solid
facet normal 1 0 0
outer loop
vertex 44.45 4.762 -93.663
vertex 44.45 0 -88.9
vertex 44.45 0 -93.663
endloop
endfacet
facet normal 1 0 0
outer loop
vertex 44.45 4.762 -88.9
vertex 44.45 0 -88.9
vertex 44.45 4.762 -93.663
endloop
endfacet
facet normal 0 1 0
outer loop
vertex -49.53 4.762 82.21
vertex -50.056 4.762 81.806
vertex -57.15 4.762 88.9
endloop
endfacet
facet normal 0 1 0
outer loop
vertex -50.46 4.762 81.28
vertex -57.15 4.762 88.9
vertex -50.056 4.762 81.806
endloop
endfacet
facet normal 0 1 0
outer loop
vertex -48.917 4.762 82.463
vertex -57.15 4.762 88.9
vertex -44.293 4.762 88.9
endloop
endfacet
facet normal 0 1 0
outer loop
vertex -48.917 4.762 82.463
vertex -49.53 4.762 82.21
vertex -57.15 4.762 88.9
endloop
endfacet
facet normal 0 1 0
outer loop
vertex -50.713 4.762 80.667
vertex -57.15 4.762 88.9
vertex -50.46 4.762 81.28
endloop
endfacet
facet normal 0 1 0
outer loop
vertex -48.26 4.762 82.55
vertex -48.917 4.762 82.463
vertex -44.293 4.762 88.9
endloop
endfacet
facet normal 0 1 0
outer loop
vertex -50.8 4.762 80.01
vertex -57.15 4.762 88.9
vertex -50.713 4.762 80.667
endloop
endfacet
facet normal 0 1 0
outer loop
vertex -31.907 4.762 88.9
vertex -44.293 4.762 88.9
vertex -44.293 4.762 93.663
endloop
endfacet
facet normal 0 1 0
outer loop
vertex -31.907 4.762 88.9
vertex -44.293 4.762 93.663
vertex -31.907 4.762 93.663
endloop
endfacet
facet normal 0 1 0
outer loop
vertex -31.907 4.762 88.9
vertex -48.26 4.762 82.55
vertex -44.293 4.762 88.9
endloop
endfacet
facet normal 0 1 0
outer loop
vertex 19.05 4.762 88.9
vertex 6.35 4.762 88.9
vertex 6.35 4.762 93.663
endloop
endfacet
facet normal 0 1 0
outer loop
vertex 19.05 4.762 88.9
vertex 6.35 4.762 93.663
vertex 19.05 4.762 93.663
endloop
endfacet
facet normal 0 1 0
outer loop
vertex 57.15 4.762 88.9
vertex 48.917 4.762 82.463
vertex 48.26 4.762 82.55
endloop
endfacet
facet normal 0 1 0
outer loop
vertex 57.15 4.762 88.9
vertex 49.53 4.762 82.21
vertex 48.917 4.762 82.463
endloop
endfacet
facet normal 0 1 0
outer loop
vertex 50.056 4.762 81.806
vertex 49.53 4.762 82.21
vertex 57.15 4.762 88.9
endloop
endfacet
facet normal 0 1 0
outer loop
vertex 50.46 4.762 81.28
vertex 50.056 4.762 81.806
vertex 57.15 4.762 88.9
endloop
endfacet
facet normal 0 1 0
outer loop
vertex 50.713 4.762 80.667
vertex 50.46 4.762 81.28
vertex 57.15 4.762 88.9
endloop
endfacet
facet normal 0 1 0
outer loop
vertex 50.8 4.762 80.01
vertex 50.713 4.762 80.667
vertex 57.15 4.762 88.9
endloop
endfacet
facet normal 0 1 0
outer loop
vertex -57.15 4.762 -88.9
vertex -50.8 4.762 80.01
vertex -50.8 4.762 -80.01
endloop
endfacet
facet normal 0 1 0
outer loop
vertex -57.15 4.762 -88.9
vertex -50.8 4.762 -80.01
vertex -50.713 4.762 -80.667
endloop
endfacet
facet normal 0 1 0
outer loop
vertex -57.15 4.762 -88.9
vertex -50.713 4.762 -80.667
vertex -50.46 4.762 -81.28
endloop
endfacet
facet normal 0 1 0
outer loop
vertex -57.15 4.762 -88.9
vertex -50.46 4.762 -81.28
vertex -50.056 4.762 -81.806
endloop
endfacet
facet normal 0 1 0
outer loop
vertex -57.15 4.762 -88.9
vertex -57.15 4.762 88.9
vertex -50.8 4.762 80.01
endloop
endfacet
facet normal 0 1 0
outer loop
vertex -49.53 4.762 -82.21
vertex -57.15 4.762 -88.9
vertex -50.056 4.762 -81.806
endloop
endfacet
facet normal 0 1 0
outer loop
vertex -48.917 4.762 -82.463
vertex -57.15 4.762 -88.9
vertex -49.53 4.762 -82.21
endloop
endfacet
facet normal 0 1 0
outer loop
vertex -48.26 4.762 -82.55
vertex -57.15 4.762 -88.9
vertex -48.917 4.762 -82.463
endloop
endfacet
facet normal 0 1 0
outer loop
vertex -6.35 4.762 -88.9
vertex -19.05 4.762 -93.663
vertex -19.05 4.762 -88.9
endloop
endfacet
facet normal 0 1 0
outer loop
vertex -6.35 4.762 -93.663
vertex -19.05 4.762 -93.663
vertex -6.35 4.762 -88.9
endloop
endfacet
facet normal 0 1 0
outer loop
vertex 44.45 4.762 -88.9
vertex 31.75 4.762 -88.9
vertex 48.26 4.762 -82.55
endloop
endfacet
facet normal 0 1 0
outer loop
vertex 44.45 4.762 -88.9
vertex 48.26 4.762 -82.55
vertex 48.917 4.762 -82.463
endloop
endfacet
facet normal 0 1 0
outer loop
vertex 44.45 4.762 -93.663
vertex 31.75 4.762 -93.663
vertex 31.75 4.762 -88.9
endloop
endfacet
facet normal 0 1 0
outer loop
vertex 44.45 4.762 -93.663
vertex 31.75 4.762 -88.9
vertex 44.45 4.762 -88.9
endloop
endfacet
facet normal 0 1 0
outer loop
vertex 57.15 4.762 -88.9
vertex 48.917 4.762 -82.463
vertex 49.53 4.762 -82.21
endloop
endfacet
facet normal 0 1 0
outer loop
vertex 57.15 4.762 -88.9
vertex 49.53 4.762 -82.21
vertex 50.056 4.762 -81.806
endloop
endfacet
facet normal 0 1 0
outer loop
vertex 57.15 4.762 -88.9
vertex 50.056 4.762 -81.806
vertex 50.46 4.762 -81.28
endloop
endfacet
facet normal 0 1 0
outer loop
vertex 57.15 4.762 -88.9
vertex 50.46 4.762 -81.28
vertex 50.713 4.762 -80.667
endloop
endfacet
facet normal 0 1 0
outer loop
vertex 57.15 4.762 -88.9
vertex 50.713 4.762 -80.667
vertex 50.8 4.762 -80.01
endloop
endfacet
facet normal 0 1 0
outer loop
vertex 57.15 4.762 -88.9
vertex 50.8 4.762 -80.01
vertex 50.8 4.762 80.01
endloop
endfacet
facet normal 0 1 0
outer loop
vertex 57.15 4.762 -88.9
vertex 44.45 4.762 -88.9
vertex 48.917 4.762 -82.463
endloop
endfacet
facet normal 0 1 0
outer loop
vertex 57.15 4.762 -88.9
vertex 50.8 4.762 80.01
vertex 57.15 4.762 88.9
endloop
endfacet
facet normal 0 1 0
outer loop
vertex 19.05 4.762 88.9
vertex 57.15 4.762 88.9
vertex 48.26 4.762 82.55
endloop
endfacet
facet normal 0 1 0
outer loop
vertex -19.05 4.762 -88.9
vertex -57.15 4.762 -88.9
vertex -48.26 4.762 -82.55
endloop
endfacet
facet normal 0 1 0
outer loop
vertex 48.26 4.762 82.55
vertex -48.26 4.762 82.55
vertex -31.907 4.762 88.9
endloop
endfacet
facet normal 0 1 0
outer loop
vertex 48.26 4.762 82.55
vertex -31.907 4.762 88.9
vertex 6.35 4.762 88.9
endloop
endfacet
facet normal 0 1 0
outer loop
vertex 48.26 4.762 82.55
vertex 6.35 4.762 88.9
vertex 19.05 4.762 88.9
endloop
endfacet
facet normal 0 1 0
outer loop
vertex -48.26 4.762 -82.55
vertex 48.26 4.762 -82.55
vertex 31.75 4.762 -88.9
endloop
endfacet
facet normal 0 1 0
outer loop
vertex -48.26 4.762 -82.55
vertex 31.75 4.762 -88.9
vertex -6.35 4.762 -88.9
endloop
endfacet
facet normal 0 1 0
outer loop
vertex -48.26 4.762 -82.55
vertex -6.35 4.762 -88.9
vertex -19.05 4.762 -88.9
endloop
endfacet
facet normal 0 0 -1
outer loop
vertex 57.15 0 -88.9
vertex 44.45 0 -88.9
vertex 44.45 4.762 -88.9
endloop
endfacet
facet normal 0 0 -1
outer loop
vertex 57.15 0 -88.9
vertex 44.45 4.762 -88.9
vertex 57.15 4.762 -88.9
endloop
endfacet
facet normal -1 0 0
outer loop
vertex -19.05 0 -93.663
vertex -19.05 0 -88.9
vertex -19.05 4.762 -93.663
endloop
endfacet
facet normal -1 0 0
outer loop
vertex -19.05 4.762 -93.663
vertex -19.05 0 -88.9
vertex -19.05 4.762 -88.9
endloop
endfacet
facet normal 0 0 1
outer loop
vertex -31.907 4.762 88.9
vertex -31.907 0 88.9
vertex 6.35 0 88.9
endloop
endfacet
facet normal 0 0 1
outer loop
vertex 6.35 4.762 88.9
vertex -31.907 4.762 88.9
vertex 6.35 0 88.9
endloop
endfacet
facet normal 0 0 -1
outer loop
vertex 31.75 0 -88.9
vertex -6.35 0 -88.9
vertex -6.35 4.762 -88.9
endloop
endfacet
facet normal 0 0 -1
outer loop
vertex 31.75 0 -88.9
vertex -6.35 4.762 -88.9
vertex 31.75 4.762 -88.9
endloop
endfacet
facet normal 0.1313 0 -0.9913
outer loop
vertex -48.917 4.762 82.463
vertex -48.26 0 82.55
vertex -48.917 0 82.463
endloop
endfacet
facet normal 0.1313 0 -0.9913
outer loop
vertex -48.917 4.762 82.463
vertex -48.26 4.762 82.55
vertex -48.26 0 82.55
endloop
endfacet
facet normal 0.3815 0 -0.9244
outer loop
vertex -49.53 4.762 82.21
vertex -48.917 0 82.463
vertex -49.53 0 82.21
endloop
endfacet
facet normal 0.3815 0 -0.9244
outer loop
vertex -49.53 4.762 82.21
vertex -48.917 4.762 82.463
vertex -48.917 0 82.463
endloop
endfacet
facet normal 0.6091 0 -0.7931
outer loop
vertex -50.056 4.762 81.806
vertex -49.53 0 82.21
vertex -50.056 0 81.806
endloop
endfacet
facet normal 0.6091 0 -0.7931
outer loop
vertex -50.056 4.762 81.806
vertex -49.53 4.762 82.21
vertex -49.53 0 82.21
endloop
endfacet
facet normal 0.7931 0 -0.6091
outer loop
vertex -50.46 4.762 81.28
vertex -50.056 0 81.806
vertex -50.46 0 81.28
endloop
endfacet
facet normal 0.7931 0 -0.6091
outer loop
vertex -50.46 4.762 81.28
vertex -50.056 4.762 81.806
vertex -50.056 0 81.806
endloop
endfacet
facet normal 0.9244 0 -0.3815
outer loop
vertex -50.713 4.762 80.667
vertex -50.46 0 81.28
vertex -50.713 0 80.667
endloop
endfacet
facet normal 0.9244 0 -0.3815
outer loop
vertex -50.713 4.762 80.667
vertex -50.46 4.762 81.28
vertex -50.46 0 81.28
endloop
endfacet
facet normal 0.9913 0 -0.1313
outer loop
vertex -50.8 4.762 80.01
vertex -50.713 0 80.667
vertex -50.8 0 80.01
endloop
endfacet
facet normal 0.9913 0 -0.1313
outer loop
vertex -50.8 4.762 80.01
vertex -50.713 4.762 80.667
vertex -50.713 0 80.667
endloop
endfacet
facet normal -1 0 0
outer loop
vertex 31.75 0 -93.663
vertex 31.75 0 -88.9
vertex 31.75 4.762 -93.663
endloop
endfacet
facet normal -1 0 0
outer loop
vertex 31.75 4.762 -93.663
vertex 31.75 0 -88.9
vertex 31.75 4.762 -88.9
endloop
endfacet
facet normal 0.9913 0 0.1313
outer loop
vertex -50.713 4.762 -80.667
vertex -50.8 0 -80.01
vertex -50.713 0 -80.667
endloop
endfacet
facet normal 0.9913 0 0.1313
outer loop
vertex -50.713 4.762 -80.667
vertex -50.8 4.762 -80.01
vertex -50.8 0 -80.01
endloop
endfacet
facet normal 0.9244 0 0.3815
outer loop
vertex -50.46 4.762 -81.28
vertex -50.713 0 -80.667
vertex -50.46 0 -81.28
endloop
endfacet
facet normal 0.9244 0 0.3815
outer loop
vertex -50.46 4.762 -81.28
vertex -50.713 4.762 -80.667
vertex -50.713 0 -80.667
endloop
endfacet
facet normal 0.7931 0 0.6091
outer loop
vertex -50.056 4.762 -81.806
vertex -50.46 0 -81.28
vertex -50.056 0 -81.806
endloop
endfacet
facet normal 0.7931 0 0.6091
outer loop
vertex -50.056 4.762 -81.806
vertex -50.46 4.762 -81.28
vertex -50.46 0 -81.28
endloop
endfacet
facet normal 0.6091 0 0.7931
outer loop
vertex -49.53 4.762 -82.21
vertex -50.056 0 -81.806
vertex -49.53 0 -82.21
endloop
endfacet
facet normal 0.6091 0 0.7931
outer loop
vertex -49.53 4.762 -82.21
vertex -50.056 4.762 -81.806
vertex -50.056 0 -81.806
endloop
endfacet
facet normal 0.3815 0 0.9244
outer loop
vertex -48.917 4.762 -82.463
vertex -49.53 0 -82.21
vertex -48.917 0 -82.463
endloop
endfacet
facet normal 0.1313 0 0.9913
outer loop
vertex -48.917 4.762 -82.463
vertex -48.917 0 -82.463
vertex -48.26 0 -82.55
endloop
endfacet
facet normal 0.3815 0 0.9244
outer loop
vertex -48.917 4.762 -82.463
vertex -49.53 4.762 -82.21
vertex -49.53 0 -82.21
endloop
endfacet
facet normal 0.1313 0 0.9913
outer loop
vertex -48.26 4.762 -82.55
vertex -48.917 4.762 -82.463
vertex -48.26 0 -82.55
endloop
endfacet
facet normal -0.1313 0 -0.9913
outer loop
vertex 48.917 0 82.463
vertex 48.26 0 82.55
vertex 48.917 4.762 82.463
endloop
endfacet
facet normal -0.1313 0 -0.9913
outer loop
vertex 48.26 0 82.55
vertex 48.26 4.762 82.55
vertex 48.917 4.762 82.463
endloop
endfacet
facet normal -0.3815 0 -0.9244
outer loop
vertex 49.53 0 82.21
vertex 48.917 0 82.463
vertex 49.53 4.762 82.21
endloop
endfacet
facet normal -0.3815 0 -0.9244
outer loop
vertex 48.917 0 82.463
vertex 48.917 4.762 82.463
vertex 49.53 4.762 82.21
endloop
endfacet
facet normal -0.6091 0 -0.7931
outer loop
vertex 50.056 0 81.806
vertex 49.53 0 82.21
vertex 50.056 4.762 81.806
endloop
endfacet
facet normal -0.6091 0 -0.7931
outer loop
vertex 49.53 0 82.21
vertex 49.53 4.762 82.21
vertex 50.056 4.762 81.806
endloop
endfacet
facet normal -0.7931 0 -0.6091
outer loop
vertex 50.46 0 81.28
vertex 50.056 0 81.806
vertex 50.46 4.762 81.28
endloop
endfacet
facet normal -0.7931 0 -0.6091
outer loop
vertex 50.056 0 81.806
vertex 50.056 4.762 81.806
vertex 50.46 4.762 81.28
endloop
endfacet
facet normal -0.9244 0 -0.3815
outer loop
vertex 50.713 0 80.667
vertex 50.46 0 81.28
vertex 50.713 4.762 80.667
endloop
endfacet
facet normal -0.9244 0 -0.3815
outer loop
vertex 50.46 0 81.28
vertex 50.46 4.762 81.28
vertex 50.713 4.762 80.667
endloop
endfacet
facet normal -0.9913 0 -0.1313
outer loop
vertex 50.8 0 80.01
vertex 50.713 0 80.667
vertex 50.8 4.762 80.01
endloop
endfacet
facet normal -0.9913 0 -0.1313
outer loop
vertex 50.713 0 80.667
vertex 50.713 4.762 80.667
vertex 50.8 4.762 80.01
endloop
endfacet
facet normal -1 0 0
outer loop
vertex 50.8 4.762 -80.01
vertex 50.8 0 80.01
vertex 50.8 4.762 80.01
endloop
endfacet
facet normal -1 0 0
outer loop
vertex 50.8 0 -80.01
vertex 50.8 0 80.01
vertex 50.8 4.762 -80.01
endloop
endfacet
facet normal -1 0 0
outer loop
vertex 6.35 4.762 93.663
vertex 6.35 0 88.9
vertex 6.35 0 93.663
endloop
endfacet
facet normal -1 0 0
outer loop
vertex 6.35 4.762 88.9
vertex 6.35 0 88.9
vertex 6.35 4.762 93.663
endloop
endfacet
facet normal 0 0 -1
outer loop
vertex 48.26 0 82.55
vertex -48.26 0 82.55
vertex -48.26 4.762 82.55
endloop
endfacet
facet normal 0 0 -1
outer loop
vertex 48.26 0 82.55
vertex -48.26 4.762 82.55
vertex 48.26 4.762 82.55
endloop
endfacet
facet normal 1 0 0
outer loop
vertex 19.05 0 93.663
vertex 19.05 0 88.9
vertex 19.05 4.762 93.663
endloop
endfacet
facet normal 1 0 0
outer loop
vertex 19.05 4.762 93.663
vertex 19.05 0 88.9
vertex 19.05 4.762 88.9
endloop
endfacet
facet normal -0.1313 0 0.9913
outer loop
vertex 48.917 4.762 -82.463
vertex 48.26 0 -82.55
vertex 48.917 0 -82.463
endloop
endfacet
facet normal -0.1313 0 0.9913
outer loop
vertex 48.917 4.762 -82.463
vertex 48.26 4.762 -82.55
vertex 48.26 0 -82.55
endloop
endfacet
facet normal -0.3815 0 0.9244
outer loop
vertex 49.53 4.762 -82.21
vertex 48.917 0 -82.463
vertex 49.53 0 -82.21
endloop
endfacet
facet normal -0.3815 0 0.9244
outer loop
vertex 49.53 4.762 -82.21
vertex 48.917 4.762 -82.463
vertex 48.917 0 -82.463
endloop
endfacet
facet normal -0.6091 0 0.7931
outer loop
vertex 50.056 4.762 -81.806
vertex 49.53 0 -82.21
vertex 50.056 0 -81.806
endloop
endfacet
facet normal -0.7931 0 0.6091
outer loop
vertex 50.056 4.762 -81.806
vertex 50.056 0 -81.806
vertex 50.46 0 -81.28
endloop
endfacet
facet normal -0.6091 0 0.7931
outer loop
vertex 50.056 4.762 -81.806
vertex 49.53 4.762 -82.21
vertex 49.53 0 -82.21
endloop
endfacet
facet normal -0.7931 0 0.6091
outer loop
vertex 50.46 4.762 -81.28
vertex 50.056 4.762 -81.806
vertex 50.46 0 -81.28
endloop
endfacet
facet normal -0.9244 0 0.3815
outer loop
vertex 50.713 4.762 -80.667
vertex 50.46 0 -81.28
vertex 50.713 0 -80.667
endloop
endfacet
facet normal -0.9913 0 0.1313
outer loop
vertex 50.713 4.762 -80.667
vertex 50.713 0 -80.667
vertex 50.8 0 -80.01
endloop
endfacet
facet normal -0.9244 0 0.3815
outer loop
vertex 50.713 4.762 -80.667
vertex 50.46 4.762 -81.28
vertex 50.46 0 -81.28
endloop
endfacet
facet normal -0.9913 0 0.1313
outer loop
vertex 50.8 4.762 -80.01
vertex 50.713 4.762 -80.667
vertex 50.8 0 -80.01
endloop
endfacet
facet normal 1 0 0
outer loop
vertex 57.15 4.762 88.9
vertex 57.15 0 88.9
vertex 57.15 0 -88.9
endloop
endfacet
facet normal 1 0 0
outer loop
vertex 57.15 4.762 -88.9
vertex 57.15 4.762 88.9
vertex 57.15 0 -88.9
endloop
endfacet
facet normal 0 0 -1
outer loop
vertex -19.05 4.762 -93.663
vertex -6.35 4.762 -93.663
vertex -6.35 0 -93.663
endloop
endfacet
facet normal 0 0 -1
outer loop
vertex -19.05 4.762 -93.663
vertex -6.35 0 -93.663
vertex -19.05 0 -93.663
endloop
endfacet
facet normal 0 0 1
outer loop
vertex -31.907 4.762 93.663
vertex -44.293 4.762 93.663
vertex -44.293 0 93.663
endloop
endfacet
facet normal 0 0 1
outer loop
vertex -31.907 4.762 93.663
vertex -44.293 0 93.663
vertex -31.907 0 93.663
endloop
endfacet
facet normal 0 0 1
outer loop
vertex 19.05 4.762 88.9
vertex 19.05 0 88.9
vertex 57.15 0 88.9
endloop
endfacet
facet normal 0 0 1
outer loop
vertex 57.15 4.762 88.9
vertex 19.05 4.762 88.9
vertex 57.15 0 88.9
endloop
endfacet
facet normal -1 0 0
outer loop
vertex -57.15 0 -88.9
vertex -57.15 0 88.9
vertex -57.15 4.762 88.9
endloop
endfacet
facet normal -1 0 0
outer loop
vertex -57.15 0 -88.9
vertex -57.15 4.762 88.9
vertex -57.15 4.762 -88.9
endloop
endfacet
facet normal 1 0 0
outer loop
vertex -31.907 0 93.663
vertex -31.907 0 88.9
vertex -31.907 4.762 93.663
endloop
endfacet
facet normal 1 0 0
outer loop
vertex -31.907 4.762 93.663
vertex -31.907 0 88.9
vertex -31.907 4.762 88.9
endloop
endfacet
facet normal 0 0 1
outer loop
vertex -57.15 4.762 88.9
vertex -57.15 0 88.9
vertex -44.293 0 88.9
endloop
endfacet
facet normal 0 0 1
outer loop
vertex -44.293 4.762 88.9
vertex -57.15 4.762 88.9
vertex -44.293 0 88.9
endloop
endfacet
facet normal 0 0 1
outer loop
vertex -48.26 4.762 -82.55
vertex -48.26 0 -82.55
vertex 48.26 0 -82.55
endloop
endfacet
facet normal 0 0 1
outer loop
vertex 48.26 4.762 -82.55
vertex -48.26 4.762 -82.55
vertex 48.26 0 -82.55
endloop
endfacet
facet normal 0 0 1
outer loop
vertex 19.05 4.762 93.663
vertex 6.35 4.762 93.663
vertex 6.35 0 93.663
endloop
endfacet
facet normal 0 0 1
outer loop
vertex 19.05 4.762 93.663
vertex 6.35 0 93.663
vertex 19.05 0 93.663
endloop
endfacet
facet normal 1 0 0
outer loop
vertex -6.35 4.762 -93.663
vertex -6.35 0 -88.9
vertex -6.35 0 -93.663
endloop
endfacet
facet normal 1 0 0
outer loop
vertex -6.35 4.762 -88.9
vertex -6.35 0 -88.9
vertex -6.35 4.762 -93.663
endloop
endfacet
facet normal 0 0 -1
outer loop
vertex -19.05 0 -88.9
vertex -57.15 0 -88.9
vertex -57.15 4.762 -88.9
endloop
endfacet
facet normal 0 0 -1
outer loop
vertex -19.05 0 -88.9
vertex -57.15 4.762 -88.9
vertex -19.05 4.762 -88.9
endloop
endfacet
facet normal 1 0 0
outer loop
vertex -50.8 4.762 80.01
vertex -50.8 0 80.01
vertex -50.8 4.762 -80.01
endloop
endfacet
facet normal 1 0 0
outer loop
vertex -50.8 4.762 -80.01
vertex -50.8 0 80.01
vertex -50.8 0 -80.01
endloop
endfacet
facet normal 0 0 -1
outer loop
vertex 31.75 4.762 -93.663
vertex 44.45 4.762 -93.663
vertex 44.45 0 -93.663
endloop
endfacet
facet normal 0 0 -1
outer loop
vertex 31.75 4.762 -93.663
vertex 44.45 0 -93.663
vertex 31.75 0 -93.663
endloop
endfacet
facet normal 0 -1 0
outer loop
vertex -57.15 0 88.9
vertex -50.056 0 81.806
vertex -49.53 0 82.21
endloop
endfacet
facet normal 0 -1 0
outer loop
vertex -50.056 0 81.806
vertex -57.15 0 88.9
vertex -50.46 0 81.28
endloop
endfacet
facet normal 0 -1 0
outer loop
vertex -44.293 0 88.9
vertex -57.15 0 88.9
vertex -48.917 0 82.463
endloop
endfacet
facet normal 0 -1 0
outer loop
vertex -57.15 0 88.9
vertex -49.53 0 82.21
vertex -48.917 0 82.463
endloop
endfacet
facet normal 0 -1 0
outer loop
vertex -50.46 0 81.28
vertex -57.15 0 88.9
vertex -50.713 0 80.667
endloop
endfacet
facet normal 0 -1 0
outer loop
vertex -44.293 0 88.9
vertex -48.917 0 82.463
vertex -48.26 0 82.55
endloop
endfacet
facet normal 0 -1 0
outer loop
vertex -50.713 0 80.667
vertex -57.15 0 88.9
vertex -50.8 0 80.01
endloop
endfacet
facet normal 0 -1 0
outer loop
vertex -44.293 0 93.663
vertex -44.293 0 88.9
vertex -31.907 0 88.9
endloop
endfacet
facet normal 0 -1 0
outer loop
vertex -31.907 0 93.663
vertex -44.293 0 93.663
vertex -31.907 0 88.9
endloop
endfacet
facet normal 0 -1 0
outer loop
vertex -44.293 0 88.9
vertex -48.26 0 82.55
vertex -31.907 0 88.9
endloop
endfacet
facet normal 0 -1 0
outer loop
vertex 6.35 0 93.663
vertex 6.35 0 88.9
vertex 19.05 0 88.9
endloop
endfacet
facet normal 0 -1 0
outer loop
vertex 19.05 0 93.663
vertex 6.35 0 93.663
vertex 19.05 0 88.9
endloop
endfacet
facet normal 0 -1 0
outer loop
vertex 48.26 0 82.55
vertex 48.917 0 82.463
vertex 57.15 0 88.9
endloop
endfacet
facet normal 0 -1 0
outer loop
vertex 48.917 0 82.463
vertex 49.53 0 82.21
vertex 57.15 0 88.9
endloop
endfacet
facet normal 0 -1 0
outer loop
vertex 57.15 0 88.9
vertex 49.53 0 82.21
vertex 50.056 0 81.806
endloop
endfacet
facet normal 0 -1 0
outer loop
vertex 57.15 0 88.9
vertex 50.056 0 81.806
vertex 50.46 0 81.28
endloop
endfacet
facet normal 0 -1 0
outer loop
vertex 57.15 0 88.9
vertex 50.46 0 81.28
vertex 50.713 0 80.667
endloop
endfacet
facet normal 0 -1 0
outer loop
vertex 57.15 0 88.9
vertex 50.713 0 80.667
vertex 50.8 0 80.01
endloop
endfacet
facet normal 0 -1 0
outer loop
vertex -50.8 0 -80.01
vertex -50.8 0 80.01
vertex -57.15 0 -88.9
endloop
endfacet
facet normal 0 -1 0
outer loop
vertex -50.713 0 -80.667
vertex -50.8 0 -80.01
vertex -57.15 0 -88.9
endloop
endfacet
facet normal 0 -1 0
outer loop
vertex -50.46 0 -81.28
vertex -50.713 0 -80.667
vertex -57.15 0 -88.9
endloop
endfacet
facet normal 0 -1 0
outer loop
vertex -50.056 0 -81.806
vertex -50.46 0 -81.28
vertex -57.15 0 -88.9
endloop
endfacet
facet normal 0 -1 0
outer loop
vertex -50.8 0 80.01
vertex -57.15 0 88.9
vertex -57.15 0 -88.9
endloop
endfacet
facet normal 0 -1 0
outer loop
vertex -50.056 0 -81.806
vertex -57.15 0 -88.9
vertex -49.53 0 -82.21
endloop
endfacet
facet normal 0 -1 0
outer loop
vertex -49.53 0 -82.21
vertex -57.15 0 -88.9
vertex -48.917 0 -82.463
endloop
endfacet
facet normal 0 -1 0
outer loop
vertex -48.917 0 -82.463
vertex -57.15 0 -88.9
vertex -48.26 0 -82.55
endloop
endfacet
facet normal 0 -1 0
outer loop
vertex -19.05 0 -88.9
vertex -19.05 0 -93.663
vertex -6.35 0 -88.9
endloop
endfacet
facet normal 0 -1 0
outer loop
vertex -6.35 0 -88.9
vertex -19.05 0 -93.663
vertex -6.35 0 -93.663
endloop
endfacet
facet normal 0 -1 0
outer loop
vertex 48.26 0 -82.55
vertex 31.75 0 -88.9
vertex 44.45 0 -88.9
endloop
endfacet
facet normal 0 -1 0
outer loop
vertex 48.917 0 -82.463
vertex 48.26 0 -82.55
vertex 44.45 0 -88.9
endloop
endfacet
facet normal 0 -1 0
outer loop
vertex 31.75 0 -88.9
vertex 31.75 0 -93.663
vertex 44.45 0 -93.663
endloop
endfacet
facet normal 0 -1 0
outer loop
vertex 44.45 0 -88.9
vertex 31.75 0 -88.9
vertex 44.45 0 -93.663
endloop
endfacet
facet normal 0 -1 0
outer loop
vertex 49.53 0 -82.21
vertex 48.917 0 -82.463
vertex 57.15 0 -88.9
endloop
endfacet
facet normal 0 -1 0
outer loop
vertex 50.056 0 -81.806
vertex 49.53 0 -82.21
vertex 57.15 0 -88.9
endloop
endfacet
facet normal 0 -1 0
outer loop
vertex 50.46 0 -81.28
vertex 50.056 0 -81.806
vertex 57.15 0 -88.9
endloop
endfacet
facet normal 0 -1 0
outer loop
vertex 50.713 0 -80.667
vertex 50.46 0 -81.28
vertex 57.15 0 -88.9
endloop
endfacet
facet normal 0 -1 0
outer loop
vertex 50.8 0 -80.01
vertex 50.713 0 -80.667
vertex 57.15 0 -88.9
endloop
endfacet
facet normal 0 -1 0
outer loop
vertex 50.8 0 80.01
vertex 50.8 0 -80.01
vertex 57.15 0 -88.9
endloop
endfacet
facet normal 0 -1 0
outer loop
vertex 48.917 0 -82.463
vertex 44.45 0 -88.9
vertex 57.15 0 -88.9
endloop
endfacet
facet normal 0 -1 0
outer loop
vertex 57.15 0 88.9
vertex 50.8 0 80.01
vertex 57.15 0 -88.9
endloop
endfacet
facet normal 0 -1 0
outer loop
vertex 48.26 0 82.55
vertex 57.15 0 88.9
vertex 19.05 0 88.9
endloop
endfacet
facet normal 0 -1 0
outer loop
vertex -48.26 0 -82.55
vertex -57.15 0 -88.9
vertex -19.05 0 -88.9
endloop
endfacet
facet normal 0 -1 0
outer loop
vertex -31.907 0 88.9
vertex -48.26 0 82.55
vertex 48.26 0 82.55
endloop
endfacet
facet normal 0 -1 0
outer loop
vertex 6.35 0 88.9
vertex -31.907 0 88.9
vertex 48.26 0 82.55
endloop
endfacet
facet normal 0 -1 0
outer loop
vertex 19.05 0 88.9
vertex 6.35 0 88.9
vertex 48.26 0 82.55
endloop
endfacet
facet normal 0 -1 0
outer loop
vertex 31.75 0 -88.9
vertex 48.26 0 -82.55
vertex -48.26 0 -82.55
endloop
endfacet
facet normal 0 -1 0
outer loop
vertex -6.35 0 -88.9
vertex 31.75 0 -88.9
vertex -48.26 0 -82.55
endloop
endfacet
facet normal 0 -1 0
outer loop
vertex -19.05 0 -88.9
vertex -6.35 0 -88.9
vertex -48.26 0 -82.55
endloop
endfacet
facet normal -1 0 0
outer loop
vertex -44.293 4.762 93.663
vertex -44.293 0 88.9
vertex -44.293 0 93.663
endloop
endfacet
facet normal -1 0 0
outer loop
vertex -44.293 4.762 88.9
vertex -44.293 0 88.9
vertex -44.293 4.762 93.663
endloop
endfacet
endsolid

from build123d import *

# Parameters (mm, degrees)
SKETCH1_W           = 114.3
SKETCH1_H           = 177.8
SKETCH1_W_2         = 101.6
SKETCH1_H_2         = 165.1
BOSS_EXTRUDE1_DEPTH = 4.7625
SKETCH2_W           = 12.38677804
SKETCH2_H           = 4.7625
SKETCH2_W_2         = 12.7
BOSS_EXTRUDE2_DEPTH = 4.7625
SKETCH3_W           = 12.7
SKETCH3_H           = 4.7625
BOSS_EXTRUDE3_DEPTH = 4.7625
FILLET1_R           = 2.54


with BuildPart() as part:
    # Sketch1 → Boss-Extrude1 (new body)
    with BuildSketch(Plane(origin=(0, 0, 0), x_dir=(1, 0, 0), z_dir=(0, 1, 0))):
        Rectangle(SKETCH1_W, SKETCH1_H)
        Rectangle(SKETCH1_W_2, SKETCH1_H_2, mode=Mode.SUBTRACT)
    extrude(amount=BOSS_EXTRUDE1_DEPTH)

    # Sketch2 → Boss-Extrude2 (add)
    with BuildSketch(Plane.XY.offset(88.9)):
        with Locations((-38.1, 2.38125)):
            Rectangle(SKETCH2_W, SKETCH2_H)
        with Locations((12.7, 2.38125)):
            Rectangle(SKETCH2_W_2, SKETCH2_H)
    extrude(amount=BOSS_EXTRUDE2_DEPTH)

    # Sketch3 → Boss-Extrude3 (add)
    with BuildSketch(Plane(origin=(0, 0, -88.9), x_dir=(-1, 0, 0), z_dir=(0, 0, -1))):
        with Locations((-38.1, 2.38125)):
            Rectangle(SKETCH3_W, SKETCH3_H)
        with Locations((12.7, 2.38125)):
            Rectangle(SKETCH3_W, SKETCH3_H)
    extrude(amount=BOSS_EXTRUDE3_DEPTH)

    # Fillet1
    fillet1_edges = [part.edges().sort_by_distance(p)[0] for p in [
        (50.8, 2.38125, 82.55),
        (50.8, 2.38125, -82.55),
        (-50.8, 2.38125, -82.55),
        (-50.8, 2.38125, 82.55),
    ]]
    fillet(fillet1_edges, radius=FILLET1_R)


solid = part.part
